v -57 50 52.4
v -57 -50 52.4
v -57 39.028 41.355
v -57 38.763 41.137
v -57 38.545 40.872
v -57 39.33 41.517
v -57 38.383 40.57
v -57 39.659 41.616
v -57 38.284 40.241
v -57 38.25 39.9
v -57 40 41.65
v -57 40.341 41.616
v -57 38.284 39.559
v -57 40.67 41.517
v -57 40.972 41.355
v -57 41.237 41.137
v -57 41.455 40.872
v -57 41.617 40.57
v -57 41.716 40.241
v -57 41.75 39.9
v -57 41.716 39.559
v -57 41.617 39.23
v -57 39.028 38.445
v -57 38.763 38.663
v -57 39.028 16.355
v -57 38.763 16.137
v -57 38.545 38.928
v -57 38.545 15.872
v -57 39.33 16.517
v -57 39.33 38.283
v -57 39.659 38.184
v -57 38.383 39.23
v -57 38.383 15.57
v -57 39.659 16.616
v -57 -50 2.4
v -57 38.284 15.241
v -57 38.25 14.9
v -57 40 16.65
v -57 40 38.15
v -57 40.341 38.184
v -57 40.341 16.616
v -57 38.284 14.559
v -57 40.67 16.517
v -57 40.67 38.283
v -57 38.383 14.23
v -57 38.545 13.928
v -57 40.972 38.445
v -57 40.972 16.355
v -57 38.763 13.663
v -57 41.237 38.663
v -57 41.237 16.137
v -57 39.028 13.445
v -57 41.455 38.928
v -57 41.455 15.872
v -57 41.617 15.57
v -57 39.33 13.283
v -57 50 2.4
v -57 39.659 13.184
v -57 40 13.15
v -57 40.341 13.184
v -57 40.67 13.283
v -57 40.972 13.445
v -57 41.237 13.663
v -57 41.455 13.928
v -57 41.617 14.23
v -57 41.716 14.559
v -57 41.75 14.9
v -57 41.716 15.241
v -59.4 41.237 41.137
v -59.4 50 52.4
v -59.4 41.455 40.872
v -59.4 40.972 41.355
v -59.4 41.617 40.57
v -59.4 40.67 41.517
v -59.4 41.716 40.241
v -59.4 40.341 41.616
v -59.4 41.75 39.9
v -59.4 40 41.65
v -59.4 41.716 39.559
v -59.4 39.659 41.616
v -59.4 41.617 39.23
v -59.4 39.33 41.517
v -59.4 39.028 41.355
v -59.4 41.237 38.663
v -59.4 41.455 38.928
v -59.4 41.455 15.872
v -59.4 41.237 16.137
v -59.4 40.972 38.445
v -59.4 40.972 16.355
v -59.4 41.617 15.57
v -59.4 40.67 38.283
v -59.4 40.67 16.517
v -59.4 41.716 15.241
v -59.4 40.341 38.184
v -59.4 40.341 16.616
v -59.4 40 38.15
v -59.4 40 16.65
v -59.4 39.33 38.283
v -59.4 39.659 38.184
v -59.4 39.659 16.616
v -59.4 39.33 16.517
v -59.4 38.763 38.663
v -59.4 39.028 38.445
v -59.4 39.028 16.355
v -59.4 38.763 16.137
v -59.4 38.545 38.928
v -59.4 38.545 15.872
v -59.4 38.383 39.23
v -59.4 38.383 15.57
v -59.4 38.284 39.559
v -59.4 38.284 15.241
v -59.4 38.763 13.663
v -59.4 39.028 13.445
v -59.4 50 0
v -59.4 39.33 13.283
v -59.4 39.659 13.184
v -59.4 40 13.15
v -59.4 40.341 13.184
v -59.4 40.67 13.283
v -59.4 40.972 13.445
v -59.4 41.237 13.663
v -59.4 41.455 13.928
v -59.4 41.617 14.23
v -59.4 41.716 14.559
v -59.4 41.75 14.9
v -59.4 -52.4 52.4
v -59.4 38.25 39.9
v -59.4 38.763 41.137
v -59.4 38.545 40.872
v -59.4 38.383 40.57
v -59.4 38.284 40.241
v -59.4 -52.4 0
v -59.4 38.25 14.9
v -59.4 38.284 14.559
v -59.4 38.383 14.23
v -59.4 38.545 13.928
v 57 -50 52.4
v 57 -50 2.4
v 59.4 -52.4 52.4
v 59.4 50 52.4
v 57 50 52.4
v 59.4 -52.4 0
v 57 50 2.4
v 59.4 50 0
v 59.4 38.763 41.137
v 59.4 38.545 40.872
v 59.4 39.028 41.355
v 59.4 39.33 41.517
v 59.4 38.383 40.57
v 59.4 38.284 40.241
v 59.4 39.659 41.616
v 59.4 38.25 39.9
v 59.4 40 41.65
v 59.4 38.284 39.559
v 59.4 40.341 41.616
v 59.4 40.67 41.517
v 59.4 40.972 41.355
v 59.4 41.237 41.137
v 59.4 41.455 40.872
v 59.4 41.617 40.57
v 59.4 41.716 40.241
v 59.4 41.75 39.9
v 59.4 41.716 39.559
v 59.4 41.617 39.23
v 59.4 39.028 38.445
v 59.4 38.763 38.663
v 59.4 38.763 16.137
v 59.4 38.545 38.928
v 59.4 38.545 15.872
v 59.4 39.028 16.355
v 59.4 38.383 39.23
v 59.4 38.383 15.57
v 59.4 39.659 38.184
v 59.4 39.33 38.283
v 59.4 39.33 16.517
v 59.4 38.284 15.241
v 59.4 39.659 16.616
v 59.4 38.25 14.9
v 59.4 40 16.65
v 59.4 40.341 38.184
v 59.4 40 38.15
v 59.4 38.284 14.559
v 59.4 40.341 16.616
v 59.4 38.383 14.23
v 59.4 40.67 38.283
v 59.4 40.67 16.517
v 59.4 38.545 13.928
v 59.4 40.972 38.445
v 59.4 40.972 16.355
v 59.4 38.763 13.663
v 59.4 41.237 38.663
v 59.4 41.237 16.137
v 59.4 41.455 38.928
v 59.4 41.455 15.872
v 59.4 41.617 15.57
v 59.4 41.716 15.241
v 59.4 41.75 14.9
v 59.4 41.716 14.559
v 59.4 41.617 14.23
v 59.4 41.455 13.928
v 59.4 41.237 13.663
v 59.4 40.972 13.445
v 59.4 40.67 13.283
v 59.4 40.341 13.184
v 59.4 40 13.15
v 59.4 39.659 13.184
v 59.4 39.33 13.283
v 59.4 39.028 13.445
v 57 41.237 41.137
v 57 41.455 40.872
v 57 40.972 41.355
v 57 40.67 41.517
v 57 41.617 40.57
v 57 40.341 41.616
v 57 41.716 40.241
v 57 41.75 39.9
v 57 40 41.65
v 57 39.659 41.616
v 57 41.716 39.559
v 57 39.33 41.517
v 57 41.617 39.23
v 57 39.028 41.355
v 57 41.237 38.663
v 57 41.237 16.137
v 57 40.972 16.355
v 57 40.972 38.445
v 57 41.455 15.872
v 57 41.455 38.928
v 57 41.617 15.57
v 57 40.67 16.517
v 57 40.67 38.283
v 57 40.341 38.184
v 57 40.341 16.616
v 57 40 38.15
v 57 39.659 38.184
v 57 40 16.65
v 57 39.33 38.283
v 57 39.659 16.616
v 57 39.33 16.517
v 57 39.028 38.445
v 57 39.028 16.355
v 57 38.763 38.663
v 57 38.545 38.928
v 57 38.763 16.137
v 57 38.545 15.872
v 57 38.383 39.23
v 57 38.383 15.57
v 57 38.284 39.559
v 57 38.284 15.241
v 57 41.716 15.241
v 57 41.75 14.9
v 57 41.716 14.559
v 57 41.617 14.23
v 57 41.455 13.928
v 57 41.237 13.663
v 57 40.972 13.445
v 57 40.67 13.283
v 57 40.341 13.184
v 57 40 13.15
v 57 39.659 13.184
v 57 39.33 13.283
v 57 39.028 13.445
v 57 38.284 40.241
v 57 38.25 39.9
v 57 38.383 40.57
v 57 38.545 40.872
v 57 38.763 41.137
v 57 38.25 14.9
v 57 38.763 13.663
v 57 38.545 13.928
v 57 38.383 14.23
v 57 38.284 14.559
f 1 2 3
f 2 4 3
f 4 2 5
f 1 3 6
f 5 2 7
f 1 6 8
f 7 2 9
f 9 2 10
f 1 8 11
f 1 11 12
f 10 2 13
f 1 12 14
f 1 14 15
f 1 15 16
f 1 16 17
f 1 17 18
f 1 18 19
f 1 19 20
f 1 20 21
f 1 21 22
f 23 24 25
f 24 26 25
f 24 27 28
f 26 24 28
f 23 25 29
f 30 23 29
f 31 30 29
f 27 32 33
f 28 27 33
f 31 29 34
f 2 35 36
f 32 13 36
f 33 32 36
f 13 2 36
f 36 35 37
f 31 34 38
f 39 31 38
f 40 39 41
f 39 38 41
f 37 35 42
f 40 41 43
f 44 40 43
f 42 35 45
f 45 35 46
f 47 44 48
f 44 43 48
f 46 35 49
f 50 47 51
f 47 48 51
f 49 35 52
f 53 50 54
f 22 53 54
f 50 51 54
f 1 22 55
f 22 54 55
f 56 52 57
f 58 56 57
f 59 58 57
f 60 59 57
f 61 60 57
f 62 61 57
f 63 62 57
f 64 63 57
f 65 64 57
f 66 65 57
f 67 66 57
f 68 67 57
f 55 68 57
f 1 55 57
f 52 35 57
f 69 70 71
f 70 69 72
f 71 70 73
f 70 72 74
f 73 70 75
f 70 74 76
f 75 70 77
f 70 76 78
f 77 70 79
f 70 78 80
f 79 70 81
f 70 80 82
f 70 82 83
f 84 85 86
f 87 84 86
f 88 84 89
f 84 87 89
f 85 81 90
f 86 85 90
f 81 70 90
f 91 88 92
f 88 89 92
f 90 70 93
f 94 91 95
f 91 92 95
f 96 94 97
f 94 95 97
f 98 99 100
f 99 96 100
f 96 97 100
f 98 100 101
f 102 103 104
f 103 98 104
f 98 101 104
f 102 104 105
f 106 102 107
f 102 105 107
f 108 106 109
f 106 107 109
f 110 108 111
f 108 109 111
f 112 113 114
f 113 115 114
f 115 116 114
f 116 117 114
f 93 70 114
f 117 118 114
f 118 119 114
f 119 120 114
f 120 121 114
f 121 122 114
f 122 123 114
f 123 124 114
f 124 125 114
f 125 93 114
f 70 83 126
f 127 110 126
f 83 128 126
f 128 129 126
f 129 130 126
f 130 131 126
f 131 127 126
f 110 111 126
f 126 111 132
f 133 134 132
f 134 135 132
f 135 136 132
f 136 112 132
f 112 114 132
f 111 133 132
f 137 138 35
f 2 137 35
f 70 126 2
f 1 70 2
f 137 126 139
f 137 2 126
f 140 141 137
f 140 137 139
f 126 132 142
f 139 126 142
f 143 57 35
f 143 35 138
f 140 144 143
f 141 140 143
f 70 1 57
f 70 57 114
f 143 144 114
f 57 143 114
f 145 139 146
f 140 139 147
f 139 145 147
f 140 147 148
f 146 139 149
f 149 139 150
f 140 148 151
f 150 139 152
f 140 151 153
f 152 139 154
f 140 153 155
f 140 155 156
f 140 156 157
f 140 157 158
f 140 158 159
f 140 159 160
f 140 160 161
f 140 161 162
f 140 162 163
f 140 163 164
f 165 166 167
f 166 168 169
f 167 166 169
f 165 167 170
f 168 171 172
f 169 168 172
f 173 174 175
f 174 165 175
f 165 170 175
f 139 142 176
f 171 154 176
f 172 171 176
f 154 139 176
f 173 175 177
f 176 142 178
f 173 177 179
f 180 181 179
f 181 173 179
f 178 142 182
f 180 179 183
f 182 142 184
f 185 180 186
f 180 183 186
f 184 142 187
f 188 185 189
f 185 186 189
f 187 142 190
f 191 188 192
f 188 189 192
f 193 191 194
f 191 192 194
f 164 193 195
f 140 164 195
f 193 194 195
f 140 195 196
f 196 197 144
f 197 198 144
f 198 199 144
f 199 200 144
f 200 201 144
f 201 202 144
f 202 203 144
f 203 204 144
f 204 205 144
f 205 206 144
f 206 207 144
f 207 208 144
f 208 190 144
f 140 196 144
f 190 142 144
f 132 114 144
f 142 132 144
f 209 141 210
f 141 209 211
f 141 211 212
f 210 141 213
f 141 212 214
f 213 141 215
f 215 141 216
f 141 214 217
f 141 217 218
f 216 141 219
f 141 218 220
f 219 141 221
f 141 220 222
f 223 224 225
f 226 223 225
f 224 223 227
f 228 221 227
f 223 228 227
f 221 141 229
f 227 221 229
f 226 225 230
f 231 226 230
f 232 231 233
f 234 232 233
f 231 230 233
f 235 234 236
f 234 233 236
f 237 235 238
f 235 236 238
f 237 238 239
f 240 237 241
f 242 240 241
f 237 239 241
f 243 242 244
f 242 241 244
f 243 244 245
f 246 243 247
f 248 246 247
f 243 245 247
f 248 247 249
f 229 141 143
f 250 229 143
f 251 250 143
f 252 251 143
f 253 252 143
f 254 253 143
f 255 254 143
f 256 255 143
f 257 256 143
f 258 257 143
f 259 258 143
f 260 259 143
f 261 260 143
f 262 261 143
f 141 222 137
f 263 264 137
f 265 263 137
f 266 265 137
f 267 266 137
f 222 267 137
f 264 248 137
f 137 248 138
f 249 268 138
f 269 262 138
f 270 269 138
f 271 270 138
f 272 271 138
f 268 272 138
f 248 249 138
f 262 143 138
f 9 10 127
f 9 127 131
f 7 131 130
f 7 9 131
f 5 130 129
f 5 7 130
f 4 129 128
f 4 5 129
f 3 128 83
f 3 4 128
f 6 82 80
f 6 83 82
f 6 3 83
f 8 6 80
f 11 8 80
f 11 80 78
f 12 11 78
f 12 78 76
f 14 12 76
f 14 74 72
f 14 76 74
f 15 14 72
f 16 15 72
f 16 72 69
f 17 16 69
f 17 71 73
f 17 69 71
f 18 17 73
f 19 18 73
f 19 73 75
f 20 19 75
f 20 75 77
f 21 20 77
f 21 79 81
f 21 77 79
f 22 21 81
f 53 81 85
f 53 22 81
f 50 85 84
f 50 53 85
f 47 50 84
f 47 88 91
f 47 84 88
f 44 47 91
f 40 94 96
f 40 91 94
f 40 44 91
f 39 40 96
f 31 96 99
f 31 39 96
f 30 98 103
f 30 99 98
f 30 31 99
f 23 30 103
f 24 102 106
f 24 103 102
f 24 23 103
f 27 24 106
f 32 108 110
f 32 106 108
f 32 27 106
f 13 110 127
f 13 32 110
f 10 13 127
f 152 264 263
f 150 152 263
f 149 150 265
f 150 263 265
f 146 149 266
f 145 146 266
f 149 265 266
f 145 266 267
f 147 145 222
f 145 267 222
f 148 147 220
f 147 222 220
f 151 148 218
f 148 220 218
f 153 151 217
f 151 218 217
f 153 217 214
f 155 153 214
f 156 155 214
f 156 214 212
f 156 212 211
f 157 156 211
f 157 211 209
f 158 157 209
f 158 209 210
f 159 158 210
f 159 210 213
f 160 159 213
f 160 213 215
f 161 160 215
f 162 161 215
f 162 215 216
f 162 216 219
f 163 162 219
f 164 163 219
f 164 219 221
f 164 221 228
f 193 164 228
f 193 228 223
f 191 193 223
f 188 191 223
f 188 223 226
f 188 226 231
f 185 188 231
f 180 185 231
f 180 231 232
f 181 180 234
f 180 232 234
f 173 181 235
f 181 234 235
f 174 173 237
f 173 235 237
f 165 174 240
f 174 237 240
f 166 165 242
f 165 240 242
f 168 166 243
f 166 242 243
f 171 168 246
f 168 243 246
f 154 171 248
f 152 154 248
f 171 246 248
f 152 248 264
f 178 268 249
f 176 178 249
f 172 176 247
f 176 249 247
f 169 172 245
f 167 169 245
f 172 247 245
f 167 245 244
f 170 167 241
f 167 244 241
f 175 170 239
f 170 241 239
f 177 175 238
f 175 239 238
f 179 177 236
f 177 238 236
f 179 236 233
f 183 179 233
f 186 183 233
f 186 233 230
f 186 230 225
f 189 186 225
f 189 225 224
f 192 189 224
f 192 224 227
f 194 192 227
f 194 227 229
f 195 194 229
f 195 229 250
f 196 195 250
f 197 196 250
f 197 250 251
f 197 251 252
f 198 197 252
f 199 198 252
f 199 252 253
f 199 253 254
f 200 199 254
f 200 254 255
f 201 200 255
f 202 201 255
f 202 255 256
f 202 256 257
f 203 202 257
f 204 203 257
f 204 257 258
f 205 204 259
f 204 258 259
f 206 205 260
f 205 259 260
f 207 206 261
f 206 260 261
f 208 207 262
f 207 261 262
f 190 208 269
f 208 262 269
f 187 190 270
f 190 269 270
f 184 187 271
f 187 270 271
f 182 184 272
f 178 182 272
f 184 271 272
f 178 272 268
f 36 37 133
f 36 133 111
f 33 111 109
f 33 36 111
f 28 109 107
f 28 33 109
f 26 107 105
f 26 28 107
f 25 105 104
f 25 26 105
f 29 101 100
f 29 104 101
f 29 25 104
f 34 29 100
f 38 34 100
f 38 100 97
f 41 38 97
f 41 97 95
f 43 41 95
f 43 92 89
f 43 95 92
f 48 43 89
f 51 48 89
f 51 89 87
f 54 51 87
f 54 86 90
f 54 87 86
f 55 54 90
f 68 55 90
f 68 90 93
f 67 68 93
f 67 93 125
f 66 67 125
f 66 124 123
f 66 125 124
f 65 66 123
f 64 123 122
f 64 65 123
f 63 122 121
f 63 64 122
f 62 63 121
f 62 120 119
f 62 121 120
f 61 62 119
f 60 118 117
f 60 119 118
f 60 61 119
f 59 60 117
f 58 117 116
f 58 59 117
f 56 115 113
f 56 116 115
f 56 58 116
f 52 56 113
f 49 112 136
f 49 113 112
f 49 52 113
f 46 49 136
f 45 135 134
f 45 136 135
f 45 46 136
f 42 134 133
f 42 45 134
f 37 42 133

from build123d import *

# Parameters (mm, degrees)
F0_W     = 114
F0_H     = 100
F1_DEPTH = 2.4
F2_DEPTH = 52.4
F3_R     = 1.75
F4_DEPTH = 2.401
F5_DEPTH = 116.401


with BuildPart() as f1:
    # F0 (on Top) → F1 (new body)
    with BuildSketch(Plane.XY):
        Rectangle(F0_W, F0_H)
        Polygon((-57, -50), (-57, 50), (-59.4, 50), (-59.4, -52.4), (59.4, -52.4), (59.4, 50), (57, 50), (57, -50), align=None)
    extrude(amount=F1_DEPTH)

    # F0 (on Top) → F2 (join)
    with BuildSketch(Plane.XY):
        Polygon((-57, -50), (-57, 50), (-59.4, 50), (-59.4, -52.4), (59.4, -52.4), (59.4, 50), (57, 50), (57, -50), align=None)
    extrude(amount=F2_DEPTH)

    # F3 (on face) → F4 (cut, through all)
    with BuildSketch(Plane(origin=(57, 0, 0), x_dir=(0, -1, 0), z_dir=(-1, 0, 0))):
        with Locations((-40, 39.9)):
            Circle(F3_R)
        with Locations((-40, 14.9)):
            Circle(F3_R)
    extrude(amount=-F4_DEPTH, mode=Mode.SUBTRACT)

    # F3 (on face) → F5 (cut, through all)
    with BuildSketch(Plane(origin=(57, 0, 0), x_dir=(0, -1, 0), z_dir=(-1, 0, 0))):
        with Locations((-40, 39.9)):
            Circle(F3_R)
        with Locations((-40, 14.9)):
            Circle(F3_R)
    extrude(amount=F5_DEPTH, mode=Mode.SUBTRACT)


solid = f1.part
